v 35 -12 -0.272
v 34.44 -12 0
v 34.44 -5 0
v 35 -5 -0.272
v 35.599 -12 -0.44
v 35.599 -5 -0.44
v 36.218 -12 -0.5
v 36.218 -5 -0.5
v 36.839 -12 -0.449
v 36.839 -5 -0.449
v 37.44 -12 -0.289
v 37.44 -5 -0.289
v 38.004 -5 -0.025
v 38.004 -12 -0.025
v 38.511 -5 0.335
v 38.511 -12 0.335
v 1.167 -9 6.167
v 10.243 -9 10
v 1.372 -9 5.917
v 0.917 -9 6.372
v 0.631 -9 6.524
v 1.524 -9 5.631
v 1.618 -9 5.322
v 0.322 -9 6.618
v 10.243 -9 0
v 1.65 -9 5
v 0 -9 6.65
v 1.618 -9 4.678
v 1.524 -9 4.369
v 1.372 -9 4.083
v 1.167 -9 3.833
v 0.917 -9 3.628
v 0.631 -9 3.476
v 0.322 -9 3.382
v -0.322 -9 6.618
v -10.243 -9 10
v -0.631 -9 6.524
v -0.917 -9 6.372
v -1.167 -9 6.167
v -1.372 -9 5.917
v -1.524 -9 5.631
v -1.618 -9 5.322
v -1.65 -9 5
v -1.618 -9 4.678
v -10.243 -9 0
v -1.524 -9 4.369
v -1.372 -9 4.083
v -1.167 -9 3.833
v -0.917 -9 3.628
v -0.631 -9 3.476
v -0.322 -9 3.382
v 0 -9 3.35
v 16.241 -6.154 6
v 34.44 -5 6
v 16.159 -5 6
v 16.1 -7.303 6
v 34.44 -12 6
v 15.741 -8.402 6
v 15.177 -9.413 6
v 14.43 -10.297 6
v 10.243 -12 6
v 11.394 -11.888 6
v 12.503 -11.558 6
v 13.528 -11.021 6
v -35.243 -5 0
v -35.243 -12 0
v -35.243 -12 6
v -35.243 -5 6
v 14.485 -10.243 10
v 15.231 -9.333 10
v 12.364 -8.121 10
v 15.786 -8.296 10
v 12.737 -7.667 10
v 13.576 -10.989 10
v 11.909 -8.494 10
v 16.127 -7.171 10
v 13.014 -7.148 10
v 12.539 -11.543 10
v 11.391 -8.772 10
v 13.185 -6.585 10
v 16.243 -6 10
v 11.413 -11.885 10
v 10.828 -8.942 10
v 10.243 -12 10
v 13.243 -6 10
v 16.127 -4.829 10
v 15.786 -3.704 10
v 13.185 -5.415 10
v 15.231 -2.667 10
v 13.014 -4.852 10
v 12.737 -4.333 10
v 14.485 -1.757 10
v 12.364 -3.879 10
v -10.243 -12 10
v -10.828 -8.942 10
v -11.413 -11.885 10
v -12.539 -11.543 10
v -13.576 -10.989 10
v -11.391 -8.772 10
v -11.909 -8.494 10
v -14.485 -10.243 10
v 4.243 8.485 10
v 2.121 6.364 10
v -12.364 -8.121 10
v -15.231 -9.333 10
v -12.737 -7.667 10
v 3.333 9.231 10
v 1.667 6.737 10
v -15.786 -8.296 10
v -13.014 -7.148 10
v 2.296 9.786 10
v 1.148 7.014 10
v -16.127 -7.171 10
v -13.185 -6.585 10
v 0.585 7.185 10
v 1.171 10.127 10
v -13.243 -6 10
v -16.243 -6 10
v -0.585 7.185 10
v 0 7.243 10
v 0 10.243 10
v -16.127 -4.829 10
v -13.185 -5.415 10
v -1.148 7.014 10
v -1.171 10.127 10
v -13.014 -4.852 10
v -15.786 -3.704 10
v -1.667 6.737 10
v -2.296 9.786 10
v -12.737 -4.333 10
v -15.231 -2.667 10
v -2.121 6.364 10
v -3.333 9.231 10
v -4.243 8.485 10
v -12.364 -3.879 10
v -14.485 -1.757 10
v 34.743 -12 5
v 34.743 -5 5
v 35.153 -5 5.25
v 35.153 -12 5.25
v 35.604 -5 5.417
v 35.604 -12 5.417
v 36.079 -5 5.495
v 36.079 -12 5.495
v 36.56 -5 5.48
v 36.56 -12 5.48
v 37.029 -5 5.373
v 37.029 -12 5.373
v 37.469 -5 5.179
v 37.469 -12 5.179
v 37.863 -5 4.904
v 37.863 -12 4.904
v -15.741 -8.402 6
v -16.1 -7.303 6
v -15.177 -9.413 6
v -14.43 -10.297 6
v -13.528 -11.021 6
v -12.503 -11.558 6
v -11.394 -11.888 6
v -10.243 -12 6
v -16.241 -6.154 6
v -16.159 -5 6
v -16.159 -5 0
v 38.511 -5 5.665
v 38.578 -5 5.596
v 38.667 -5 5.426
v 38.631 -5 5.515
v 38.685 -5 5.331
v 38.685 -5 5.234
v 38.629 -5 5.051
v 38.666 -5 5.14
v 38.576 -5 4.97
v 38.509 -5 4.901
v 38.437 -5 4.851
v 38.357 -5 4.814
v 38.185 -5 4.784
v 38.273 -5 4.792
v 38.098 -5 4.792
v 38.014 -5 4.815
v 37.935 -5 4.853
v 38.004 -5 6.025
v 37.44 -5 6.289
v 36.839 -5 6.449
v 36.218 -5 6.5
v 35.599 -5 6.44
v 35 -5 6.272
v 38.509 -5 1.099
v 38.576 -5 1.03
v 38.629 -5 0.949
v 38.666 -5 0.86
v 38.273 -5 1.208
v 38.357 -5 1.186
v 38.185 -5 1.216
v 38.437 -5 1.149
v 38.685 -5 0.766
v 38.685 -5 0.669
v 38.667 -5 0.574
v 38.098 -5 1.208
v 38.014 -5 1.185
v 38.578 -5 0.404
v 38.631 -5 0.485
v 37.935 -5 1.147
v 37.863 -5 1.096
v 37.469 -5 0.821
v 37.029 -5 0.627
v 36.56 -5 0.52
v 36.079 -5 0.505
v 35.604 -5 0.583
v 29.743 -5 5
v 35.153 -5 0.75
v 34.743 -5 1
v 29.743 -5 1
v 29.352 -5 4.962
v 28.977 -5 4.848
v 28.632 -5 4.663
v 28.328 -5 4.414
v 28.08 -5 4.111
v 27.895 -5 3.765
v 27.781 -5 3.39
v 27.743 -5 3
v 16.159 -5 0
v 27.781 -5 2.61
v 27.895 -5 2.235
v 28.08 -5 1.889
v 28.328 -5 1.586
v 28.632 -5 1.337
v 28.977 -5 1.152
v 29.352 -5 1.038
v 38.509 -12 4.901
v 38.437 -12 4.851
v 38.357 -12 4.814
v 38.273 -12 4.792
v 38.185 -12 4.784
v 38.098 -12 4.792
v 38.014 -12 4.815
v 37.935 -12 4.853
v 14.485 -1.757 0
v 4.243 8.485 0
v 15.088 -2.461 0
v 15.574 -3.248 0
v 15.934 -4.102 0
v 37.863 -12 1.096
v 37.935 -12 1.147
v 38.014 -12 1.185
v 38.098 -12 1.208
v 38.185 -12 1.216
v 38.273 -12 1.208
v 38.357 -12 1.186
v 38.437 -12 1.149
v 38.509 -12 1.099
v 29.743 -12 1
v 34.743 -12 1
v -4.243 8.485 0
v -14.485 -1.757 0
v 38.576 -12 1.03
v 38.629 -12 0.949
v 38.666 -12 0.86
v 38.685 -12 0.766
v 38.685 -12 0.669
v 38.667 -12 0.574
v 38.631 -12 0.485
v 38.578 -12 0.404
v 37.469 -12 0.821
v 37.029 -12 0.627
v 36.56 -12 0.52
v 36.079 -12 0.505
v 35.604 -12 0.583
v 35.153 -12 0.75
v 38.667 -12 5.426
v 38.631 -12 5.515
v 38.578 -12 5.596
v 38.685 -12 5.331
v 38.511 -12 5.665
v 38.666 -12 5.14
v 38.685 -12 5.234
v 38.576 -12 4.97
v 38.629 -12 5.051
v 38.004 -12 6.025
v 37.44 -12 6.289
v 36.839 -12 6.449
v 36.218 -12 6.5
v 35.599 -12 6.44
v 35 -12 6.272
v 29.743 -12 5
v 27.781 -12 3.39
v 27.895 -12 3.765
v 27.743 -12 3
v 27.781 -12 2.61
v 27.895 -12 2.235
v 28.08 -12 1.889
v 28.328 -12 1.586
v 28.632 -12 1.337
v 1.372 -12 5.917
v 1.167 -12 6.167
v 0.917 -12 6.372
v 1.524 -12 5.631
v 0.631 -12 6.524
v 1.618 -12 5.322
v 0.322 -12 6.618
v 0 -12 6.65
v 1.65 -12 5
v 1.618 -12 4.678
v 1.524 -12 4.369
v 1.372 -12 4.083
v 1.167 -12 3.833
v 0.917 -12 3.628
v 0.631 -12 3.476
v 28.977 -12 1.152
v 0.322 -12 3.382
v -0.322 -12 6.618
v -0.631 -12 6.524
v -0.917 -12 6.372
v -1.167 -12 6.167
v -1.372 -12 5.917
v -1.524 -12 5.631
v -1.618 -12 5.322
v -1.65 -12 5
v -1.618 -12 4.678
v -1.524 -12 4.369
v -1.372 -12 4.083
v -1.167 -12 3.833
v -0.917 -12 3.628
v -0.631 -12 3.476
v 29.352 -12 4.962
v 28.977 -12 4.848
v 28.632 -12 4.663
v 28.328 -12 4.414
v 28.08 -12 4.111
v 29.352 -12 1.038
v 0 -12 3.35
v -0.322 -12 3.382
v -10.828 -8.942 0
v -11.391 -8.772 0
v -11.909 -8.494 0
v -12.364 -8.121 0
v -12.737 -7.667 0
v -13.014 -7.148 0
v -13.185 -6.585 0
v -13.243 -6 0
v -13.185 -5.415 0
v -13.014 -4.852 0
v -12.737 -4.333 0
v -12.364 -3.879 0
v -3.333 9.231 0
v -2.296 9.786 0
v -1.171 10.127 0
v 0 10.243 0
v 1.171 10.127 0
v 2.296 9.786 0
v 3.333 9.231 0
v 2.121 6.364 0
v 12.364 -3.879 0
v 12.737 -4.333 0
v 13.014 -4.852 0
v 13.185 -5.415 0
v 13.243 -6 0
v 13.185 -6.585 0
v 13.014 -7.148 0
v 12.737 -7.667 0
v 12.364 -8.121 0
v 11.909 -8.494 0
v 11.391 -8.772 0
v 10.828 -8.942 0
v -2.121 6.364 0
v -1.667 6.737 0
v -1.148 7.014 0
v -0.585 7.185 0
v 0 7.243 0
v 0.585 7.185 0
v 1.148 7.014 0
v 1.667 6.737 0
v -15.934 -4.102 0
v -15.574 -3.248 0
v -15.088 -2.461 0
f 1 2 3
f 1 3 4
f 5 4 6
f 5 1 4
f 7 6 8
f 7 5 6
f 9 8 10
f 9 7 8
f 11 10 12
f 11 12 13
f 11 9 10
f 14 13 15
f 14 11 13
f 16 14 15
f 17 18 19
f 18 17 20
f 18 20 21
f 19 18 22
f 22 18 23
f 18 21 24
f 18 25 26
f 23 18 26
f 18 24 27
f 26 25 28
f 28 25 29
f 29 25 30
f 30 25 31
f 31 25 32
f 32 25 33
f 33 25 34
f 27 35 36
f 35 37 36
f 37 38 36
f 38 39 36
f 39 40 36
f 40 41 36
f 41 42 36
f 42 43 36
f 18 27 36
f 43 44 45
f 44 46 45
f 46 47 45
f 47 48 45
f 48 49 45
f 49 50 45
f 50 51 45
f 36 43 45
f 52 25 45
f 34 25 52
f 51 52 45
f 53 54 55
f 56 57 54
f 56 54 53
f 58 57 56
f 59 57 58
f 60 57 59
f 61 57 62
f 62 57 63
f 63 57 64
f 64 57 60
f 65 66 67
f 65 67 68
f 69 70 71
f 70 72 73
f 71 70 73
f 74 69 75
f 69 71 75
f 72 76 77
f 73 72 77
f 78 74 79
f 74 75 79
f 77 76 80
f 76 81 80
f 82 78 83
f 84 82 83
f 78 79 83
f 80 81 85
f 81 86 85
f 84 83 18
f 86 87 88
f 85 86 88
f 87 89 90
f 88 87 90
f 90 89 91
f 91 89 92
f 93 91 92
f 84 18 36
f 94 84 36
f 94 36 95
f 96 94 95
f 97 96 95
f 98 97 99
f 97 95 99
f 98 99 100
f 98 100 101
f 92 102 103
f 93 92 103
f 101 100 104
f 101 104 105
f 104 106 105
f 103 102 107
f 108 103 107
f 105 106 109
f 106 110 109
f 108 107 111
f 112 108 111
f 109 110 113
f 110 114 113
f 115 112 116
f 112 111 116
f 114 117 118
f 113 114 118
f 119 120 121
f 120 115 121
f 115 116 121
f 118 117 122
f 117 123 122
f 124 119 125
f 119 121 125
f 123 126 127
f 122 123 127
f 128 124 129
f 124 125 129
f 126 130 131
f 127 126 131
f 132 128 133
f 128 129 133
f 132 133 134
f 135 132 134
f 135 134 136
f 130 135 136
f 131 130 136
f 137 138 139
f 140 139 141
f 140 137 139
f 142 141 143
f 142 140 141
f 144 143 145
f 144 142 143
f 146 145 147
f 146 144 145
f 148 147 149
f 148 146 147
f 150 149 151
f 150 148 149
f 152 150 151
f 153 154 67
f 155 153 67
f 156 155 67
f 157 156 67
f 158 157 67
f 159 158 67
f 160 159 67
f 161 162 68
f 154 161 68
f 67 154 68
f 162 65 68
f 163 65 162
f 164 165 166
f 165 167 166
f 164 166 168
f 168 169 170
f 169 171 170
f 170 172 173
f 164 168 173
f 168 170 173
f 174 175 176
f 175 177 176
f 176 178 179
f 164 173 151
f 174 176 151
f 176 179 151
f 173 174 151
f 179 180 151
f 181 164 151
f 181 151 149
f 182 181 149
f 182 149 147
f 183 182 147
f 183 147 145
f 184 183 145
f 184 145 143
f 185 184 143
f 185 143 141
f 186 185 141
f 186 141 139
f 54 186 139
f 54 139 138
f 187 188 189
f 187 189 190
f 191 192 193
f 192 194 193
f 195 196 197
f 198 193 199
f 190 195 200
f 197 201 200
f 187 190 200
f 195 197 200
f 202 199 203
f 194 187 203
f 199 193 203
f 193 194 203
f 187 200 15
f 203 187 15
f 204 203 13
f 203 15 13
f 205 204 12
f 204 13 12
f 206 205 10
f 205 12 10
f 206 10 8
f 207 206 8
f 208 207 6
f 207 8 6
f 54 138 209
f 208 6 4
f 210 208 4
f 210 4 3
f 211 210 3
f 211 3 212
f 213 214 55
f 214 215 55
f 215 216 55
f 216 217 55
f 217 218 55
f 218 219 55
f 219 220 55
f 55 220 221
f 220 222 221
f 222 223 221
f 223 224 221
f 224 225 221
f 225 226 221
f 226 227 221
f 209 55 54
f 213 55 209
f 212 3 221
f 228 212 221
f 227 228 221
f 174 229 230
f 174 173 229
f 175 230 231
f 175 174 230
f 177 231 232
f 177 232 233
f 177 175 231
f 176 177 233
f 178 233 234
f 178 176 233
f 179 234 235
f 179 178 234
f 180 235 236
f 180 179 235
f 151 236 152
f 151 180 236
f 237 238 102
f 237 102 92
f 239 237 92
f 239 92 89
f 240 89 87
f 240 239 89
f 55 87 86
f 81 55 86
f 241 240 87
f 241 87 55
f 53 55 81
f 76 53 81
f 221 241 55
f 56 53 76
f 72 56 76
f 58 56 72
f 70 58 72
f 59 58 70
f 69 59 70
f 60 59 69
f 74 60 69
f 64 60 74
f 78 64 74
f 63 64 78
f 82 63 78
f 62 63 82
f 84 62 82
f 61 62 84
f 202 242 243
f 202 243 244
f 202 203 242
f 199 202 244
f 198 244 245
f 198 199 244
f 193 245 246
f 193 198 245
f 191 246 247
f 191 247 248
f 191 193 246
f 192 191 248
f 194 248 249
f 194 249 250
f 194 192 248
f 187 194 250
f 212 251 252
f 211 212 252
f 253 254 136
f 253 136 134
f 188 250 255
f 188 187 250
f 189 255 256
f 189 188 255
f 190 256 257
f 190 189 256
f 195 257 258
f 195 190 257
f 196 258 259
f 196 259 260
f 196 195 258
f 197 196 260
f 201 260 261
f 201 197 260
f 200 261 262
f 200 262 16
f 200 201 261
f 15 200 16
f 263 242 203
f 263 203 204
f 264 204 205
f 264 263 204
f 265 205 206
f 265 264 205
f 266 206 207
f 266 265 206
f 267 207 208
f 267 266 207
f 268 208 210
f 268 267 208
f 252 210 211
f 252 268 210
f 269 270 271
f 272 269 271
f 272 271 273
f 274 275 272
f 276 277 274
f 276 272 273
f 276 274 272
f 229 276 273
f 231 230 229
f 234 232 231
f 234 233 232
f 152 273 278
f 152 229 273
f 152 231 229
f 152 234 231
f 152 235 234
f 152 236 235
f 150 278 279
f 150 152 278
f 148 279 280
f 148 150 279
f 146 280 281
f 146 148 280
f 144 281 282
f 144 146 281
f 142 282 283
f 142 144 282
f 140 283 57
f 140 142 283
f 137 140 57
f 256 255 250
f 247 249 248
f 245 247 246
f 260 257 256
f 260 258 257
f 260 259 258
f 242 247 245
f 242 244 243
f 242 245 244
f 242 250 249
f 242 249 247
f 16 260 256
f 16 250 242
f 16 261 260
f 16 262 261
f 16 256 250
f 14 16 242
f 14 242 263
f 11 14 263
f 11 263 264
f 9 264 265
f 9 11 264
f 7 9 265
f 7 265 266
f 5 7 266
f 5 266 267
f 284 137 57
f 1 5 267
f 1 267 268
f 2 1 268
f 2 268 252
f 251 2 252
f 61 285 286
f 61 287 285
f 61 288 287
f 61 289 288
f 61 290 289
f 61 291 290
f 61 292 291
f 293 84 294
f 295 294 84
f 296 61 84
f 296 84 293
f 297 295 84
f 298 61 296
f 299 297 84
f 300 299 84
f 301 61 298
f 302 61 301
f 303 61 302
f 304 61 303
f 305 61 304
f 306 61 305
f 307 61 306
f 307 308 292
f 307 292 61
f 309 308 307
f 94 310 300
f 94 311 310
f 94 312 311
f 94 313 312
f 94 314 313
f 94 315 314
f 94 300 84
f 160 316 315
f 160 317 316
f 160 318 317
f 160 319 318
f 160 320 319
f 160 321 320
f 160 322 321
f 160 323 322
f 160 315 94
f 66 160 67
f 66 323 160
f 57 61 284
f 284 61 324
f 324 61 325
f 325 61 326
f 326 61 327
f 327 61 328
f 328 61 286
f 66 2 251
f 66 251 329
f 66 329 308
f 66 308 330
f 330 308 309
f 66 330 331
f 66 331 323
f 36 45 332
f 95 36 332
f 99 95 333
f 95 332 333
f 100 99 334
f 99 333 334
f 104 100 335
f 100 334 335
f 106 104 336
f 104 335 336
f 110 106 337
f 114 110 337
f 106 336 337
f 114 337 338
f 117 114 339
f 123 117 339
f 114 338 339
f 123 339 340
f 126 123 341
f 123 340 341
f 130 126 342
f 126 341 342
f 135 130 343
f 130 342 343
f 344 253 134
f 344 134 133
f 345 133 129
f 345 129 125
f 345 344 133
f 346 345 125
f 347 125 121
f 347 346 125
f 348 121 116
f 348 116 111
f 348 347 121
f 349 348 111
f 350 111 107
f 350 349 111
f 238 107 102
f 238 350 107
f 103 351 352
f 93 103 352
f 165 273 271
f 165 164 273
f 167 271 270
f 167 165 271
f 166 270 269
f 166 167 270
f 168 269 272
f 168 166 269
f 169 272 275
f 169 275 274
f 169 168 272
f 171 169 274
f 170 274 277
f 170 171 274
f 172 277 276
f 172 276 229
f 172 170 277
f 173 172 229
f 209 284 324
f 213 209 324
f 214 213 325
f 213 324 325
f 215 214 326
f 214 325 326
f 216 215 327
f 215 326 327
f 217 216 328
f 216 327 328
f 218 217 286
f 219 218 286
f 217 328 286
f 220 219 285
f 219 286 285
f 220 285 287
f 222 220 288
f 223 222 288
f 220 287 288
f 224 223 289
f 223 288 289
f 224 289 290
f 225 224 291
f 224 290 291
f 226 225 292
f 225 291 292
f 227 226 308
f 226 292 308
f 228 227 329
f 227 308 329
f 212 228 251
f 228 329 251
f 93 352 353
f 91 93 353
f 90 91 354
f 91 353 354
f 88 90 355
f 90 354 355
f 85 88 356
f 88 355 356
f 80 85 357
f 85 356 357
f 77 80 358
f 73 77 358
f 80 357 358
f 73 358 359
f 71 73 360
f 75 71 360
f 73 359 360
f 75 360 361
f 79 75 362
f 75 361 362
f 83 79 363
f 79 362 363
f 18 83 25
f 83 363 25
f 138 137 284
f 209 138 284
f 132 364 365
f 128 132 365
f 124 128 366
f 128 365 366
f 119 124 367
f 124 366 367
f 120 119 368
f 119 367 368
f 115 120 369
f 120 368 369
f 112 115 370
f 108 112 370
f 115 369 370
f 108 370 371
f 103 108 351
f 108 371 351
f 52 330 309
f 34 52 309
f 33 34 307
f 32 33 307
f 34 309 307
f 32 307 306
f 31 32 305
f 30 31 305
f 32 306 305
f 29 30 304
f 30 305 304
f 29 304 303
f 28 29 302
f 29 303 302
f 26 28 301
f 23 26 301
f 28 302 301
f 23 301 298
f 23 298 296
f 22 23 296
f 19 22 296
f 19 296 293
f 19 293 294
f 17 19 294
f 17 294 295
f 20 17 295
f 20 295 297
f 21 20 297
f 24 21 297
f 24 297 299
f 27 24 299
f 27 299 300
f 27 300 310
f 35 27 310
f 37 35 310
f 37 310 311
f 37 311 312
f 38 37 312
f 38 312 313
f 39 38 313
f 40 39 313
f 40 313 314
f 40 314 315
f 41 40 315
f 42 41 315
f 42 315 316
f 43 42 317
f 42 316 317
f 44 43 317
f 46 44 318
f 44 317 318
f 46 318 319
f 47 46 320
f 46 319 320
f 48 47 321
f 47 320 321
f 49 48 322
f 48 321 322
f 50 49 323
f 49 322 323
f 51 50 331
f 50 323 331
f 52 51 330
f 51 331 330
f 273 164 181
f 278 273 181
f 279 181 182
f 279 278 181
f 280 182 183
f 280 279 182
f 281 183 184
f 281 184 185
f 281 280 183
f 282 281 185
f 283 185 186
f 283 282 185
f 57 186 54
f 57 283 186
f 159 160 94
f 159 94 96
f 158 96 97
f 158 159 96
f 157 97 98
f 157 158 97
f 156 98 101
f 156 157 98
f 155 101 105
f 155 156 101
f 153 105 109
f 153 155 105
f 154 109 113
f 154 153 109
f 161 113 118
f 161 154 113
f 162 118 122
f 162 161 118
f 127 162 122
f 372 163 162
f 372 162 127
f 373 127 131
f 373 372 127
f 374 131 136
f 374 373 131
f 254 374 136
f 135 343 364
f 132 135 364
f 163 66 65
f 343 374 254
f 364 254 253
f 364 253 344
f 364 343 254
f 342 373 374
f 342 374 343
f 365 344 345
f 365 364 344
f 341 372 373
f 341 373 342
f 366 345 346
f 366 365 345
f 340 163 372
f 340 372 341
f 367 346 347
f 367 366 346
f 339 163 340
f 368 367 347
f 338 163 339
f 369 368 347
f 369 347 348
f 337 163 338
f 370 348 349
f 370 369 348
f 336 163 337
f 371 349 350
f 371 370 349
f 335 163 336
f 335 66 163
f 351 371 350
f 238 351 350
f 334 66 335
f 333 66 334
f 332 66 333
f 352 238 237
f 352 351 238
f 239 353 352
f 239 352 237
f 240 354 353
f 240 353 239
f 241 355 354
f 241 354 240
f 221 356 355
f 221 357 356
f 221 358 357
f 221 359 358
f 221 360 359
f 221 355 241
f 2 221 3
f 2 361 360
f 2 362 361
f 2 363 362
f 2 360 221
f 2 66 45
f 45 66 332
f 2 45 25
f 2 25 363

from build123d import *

# Parameters (mm, degrees)
BOSS_EXTRU_4_DEPTH      = 10
TROU_TARAUD_M43_REACH   = 29.992
TROU_TARAUD_M43_BORE_R  = 1.65
BOSS_EXTRU_5_DEPTH      = 6
BOSS_EXTRU_8_DEPTH      = 7
CONG_1_R                = 0.5
ENL_V_MAT_EXTRU_1_DEPTH = 46.732281958


with BuildPart() as part:
    # Esquisse5 → Boss.-Extru.4 (new body)
    with BuildSketch(Plane.XY):
        with BuildLine():
            Line((-14.485281374, -1.757359313), (-4.242640687, 8.485281374))
            ThreePointArc((-4.242640687, 8.485281374), (0, 10.242640687), (4.242640687, 8.485281374))
            Line((4.242640687, 8.485281374), (14.485281374, -1.757359313))
            ThreePointArc((14.485281374, -1.757359313), (15.785917882, -8.296100594), (10.242640687, -12))
            Line((10.242640687, -12), (-10.242640687, -12))
            ThreePointArc((-10.242640687, -12), (-15.785917882, -8.296100594), (-14.485281374, -1.757359313))
        make_face()
        with BuildLine():
            Line((10.242640687, -9), (-10.242640687, -9))
            ThreePointArc((-10.242640687, -9), (-13.014279285, -7.148050297), (-12.363961031, -3.878679656))
            Line((-12.363961031, -3.878679656), (-2.121320344, 6.363961031))
            ThreePointArc((-2.121320344, 6.363961031), (0, 7.242640687), (2.121320344, 6.363961031))
            Line((2.121320344, 6.363961031), (12.363961031, -3.878679656))
            ThreePointArc((12.363961031, -3.878679656), (13.014279285, -7.148050297), (10.242640687, -9))
        make_face(mode=Mode.SUBTRACT)
    extrude(amount=BOSS_EXTRU_4_DEPTH)

    # Trou taraudé M43 bore (on position points) → Trou taraudé M43 (cut, up to next)
    with BuildSketch(Plane(origin=(0, -12, 5), x_dir=(0, 0, -1), z_dir=(0, -1, 0)), mode=Mode.PRIVATE) as trou_taraud_m43_sk1:
        Circle(TROU_TARAUD_M43_BORE_R)
    trou_taraud_m43_tool1 = extrude(trou_taraud_m43_sk1.sketch, amount=-TROU_TARAUD_M43_REACH, mode=Mode.PRIVATE) & part.part
    add(trou_taraud_m43_tool1.solids().sort_by_distance((0, -12, 5))[0], mode=Mode.SUBTRACT)

    # Esquisse13 → Boss.-Extru.5 (add)
    with BuildSketch(Plane.XY):
        with BuildLine():
            Line((-10.242640687, -12), (-35.242640687, -12))
            Line((-35.242640687, -12), (-35.242640687, -5))
            Line((-35.242640687, -5), (-16.15872047, -5))
            ThreePointArc((-16.15872047, -5), (-14.825216382, -9.872983346), (-10.242640687, -12))
        make_face()
        with BuildLine():
            Line((10.242640687, -12), (30.242640687, -12))
            Line((30.242640687, -12), (30.242640687, -5))
            Line((30.242640687, -5), (16.15872047, -5))
            ThreePointArc((16.15872047, -5), (14.825216382, -9.872983346), (10.242640687, -12))
        make_face()
    extrude(amount=BOSS_EXTRU_5_DEPTH)

    # Esquisse18 → Boss.-Extru.8 (add)
    with BuildSketch(Plane(origin=(0, -12, 0), x_dir=(-1, 0, 0), z_dir=(0, -1, 0))):
        with BuildLine():
            Line((-30.242640687, 0), (-34.439865049, 0))
            ThreePointArc((-34.439865049, 0), (-36.820225395, 0.452013312), (-38.923796238, -0.750243366))
            Line((-38.923796238, -0.750243366), (-38.157751795, -1.393030976))
            ThreePointArc((-38.157751795, -1.393030976), (-33.742640687, -3), (-38.157751795, -4.606969024))
            Line((-38.157751795, -4.606969024), (-38.923796238, -5.249756634))
            ThreePointArc((-38.923796238, -5.249756634), (-36.820225395, -6.452013312), (-34.439865049, -6))
            Line((-34.439865049, -6), (-30.242640687, -6))
            Line((-30.242640687, -6), (-30.242640687, 0))
        make_face()
    extrude(amount=-BOSS_EXTRU_8_DEPTH)

    # Congé1
    cong_1_edges = [part.edges().sort_by_distance(p)[0] for p in [
        (38.157751795, -8.5, 1.393030976),
        (38.923796238, -8.5, 0.750243366),
        (38.923796238, -8.5, 5.249756634),
        (38.157751795, -8.5, 4.606969024),
    ]]
    fillet(cong_1_edges, radius=CONG_1_R - 0.0001)  # a hair under: the kernel refuses the full size

    # Esquisse19 → Enlèv. mat.-Extru.1 (cut, through all)
    with BuildSketch(Plane.XZ.offset(12)):
        with BuildLine():
            Line((29.742640687, 1), (34.742640687, 1))
            ThreePointArc((34.742640687, 1), (33.742640687, 3), (34.742640687, 5))
            Line((34.742640687, 5), (29.742640687, 5))
            ThreePointArc((29.742640687, 5), (27.742640687, 3), (29.742640687, 1))
        make_face()
    extrude(amount=-ENL_V_MAT_EXTRU_1_DEPTH, mode=Mode.SUBTRACT)


solid = part.part
